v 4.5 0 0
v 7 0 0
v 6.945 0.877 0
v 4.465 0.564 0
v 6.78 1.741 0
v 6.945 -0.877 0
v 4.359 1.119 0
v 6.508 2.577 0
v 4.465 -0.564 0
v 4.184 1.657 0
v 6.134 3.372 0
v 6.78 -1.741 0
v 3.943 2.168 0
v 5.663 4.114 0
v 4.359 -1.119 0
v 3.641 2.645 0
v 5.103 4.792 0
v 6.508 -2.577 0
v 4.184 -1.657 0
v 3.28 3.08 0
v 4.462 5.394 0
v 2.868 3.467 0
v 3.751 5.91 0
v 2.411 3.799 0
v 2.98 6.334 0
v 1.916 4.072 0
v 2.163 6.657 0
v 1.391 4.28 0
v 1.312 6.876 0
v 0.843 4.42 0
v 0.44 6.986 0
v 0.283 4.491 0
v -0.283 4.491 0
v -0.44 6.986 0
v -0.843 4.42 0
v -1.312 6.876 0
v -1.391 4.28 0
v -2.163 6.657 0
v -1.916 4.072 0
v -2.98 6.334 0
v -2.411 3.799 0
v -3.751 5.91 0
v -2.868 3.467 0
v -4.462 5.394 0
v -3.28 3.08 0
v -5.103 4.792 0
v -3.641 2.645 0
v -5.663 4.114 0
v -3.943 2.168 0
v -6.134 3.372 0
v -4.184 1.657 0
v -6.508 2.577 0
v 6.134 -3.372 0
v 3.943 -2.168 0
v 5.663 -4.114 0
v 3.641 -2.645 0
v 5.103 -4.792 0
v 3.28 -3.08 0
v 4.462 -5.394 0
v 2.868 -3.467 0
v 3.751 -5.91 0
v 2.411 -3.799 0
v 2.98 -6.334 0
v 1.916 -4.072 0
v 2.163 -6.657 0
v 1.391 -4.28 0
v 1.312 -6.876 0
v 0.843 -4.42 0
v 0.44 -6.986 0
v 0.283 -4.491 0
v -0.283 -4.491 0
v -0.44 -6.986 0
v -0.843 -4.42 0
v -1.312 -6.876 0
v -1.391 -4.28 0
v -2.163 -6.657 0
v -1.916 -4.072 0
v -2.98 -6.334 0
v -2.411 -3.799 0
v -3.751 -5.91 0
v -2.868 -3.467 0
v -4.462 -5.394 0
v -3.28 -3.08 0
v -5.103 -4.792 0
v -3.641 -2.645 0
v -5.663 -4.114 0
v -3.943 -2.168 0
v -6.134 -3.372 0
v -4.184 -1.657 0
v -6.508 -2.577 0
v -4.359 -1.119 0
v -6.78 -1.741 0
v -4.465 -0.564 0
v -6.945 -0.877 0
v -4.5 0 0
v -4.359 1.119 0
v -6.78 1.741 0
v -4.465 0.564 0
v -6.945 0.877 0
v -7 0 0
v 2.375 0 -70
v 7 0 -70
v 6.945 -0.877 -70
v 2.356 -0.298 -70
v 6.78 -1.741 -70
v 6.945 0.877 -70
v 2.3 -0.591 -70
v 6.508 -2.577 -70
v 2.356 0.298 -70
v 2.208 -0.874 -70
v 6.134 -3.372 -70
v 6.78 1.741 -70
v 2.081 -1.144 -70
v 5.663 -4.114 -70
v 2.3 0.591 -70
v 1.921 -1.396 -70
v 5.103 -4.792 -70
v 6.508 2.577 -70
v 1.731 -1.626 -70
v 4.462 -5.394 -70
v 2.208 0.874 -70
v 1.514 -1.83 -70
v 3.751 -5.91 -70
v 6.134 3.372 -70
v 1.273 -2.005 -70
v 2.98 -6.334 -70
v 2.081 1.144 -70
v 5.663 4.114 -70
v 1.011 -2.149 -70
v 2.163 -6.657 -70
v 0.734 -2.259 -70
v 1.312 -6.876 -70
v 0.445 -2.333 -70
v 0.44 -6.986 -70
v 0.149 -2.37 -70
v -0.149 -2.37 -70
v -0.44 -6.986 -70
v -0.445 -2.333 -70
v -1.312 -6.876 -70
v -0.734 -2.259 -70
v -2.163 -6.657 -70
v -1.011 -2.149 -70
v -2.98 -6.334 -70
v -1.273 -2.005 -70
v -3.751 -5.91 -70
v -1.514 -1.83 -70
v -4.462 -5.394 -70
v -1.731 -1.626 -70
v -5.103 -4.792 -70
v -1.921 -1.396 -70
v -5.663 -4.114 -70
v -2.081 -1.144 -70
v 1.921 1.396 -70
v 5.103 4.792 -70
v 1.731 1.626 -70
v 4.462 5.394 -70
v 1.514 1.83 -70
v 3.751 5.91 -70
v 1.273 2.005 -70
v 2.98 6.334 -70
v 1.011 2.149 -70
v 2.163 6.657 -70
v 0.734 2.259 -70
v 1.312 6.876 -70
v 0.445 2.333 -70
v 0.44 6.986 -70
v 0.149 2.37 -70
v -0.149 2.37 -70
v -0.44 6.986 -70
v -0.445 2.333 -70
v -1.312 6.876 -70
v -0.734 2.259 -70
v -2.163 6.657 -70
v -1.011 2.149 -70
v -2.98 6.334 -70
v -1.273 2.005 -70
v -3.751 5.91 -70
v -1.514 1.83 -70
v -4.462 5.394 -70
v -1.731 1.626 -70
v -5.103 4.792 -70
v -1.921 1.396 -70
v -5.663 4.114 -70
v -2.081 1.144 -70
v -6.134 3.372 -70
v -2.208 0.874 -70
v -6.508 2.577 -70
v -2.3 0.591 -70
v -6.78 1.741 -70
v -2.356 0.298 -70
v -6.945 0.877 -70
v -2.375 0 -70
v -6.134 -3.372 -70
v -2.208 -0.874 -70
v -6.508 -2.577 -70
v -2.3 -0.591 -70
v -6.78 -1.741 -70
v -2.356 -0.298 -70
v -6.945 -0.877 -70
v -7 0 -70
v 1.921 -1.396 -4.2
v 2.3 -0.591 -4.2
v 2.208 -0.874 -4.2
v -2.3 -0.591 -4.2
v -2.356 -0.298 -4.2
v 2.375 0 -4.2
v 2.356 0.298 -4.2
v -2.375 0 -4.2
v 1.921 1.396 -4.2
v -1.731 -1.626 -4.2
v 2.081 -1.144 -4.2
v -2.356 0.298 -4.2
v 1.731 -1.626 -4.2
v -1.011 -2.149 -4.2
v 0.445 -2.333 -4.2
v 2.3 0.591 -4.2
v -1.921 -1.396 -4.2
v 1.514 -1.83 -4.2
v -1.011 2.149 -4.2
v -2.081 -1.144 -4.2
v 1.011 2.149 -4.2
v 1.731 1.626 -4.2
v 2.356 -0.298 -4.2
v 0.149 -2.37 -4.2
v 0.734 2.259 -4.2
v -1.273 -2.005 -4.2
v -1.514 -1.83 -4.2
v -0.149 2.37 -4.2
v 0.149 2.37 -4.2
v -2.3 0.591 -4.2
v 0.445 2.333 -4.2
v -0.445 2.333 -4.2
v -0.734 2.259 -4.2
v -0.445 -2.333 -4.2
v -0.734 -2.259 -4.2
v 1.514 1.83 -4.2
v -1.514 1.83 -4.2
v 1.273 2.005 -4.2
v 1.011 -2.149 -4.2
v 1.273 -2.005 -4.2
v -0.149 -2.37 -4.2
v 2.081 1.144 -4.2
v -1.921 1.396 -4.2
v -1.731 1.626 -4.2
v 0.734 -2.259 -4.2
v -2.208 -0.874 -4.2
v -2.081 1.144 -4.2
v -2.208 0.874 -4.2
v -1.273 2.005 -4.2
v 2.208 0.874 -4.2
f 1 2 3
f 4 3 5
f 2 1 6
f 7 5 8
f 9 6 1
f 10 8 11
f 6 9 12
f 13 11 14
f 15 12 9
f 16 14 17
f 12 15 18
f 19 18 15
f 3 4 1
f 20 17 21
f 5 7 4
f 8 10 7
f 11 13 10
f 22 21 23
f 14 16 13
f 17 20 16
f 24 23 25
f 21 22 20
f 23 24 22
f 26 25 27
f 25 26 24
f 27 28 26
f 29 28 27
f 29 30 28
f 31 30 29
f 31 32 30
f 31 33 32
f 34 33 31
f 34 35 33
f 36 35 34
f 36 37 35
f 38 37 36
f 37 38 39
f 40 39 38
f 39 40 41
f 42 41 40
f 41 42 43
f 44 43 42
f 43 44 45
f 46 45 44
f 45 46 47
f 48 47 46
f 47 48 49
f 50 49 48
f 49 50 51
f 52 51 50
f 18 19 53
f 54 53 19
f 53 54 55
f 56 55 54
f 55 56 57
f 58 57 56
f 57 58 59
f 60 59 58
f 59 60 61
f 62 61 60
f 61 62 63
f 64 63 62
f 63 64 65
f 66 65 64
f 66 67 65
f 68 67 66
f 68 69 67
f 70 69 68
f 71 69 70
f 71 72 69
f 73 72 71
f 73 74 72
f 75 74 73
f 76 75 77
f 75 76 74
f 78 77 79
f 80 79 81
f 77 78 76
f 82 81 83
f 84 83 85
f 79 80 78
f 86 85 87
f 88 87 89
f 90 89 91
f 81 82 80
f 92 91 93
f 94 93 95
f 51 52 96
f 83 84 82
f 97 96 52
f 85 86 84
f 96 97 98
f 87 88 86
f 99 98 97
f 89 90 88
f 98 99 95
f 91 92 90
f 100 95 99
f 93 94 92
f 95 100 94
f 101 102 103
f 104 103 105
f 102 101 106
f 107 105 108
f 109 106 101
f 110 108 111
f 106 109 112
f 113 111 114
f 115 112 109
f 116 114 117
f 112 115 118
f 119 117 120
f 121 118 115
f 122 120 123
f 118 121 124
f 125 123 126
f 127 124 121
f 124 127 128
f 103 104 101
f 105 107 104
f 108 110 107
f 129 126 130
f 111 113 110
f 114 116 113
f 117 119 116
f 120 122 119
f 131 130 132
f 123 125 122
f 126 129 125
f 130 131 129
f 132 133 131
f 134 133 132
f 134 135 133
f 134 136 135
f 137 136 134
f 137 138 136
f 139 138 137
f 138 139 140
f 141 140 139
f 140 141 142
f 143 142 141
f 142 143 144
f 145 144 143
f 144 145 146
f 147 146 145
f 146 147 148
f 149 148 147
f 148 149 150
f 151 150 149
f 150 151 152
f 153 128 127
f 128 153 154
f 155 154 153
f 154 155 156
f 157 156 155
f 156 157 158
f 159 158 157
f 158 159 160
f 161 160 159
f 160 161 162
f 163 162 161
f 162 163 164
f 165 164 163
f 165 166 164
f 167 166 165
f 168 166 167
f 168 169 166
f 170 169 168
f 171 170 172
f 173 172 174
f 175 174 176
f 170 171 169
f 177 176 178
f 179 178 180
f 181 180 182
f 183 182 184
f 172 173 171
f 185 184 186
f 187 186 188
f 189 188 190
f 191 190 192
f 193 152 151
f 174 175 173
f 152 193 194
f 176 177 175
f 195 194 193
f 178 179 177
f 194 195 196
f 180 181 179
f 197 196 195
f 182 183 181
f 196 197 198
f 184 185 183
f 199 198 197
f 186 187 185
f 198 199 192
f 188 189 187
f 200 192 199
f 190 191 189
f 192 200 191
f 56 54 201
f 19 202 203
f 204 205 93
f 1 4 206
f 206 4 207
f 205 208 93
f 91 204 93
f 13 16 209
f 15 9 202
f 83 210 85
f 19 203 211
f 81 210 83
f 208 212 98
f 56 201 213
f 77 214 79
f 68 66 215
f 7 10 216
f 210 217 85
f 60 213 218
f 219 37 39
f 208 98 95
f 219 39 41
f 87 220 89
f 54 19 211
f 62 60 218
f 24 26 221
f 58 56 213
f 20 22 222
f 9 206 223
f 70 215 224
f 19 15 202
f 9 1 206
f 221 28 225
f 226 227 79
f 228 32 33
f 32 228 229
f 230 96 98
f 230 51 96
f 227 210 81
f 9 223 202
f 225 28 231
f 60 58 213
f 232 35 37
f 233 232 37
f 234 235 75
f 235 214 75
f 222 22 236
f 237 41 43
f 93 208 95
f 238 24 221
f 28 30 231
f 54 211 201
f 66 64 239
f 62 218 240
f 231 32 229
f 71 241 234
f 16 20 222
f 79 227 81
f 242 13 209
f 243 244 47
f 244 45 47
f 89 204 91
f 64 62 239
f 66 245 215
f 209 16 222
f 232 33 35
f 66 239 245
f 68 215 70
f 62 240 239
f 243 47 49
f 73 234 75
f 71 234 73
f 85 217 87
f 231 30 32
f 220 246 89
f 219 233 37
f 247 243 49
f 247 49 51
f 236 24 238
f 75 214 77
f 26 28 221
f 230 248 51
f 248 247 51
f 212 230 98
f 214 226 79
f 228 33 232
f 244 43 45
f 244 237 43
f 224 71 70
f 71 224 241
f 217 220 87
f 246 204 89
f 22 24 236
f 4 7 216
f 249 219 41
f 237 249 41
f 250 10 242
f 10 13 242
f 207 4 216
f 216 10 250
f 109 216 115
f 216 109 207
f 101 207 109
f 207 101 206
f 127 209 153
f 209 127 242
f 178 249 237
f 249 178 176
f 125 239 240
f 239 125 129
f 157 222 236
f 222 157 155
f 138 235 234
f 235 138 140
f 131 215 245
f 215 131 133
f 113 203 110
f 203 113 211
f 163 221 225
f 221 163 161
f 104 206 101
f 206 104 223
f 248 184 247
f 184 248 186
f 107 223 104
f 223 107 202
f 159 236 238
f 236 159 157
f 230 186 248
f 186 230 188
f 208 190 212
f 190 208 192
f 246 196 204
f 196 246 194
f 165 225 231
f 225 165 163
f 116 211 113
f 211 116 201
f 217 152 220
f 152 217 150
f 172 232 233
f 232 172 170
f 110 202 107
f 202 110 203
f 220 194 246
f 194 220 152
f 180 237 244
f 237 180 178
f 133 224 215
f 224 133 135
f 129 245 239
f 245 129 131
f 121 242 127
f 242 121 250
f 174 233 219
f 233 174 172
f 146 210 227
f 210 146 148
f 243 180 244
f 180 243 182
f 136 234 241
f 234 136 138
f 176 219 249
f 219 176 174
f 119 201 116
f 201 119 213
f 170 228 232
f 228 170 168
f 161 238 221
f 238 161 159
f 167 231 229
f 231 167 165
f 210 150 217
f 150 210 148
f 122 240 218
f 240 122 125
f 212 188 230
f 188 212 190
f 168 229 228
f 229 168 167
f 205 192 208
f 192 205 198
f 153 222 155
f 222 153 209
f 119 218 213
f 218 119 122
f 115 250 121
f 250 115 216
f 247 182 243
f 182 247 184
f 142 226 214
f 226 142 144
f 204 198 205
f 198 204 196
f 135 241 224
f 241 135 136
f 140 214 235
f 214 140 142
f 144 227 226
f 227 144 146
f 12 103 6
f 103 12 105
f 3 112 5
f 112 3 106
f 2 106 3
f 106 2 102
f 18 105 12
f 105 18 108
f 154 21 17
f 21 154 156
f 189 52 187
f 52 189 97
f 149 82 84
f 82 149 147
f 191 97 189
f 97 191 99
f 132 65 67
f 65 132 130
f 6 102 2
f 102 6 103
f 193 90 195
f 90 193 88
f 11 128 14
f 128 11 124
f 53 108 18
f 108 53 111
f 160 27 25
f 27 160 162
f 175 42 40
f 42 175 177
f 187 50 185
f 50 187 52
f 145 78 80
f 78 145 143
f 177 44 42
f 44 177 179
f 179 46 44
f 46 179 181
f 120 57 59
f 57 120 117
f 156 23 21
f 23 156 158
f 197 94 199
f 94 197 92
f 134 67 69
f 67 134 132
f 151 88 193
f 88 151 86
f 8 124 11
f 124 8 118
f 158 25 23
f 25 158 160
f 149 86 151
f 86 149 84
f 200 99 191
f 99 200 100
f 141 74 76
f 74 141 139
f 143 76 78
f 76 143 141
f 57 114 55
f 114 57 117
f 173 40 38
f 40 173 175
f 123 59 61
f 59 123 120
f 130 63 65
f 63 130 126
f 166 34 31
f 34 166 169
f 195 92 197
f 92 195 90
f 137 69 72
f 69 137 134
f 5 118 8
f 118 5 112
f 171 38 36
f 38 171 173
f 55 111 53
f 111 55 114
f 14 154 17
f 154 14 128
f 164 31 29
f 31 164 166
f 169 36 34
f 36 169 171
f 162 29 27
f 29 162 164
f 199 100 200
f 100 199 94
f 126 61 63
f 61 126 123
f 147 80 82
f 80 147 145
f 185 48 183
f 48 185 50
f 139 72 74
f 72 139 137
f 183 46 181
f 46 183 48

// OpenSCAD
$fn = 50;


difference() {
	union() {
		translate(v = [0, 0, -70.0000000000]) {
			cylinder(h = 70, r = 7.0000000000);
		}
		cylinder(h = 0, r = 13.0000000000);
	}
	union() {
		translate(v = [0, 0, 0]) {
			rotate(a = [0, 0, 0]) {
				difference() {
					union() {
						#translate(v = [0, 0, -70.0000000000]) {
							cylinder(h = 70, r = 2.2500000000);
						}
						#translate(v = [0, 0, -4.2000000000]) {
							cylinder(h = 4.2000000000, r = 7.0000000000, r1 = 2.3750000000, r2 = 4.5000000000);
						}
						#translate(v = [0, 0, -70.0000000000]) {
							cylinder(h = 70, r = 2.3750000000);
						}
						#translate(v = [0, 0, -70.0000000000]) {
							cylinder(h = 70, r = 2.2500000000);
						}
					}
					union();
				}
			}
		}
	}
}
